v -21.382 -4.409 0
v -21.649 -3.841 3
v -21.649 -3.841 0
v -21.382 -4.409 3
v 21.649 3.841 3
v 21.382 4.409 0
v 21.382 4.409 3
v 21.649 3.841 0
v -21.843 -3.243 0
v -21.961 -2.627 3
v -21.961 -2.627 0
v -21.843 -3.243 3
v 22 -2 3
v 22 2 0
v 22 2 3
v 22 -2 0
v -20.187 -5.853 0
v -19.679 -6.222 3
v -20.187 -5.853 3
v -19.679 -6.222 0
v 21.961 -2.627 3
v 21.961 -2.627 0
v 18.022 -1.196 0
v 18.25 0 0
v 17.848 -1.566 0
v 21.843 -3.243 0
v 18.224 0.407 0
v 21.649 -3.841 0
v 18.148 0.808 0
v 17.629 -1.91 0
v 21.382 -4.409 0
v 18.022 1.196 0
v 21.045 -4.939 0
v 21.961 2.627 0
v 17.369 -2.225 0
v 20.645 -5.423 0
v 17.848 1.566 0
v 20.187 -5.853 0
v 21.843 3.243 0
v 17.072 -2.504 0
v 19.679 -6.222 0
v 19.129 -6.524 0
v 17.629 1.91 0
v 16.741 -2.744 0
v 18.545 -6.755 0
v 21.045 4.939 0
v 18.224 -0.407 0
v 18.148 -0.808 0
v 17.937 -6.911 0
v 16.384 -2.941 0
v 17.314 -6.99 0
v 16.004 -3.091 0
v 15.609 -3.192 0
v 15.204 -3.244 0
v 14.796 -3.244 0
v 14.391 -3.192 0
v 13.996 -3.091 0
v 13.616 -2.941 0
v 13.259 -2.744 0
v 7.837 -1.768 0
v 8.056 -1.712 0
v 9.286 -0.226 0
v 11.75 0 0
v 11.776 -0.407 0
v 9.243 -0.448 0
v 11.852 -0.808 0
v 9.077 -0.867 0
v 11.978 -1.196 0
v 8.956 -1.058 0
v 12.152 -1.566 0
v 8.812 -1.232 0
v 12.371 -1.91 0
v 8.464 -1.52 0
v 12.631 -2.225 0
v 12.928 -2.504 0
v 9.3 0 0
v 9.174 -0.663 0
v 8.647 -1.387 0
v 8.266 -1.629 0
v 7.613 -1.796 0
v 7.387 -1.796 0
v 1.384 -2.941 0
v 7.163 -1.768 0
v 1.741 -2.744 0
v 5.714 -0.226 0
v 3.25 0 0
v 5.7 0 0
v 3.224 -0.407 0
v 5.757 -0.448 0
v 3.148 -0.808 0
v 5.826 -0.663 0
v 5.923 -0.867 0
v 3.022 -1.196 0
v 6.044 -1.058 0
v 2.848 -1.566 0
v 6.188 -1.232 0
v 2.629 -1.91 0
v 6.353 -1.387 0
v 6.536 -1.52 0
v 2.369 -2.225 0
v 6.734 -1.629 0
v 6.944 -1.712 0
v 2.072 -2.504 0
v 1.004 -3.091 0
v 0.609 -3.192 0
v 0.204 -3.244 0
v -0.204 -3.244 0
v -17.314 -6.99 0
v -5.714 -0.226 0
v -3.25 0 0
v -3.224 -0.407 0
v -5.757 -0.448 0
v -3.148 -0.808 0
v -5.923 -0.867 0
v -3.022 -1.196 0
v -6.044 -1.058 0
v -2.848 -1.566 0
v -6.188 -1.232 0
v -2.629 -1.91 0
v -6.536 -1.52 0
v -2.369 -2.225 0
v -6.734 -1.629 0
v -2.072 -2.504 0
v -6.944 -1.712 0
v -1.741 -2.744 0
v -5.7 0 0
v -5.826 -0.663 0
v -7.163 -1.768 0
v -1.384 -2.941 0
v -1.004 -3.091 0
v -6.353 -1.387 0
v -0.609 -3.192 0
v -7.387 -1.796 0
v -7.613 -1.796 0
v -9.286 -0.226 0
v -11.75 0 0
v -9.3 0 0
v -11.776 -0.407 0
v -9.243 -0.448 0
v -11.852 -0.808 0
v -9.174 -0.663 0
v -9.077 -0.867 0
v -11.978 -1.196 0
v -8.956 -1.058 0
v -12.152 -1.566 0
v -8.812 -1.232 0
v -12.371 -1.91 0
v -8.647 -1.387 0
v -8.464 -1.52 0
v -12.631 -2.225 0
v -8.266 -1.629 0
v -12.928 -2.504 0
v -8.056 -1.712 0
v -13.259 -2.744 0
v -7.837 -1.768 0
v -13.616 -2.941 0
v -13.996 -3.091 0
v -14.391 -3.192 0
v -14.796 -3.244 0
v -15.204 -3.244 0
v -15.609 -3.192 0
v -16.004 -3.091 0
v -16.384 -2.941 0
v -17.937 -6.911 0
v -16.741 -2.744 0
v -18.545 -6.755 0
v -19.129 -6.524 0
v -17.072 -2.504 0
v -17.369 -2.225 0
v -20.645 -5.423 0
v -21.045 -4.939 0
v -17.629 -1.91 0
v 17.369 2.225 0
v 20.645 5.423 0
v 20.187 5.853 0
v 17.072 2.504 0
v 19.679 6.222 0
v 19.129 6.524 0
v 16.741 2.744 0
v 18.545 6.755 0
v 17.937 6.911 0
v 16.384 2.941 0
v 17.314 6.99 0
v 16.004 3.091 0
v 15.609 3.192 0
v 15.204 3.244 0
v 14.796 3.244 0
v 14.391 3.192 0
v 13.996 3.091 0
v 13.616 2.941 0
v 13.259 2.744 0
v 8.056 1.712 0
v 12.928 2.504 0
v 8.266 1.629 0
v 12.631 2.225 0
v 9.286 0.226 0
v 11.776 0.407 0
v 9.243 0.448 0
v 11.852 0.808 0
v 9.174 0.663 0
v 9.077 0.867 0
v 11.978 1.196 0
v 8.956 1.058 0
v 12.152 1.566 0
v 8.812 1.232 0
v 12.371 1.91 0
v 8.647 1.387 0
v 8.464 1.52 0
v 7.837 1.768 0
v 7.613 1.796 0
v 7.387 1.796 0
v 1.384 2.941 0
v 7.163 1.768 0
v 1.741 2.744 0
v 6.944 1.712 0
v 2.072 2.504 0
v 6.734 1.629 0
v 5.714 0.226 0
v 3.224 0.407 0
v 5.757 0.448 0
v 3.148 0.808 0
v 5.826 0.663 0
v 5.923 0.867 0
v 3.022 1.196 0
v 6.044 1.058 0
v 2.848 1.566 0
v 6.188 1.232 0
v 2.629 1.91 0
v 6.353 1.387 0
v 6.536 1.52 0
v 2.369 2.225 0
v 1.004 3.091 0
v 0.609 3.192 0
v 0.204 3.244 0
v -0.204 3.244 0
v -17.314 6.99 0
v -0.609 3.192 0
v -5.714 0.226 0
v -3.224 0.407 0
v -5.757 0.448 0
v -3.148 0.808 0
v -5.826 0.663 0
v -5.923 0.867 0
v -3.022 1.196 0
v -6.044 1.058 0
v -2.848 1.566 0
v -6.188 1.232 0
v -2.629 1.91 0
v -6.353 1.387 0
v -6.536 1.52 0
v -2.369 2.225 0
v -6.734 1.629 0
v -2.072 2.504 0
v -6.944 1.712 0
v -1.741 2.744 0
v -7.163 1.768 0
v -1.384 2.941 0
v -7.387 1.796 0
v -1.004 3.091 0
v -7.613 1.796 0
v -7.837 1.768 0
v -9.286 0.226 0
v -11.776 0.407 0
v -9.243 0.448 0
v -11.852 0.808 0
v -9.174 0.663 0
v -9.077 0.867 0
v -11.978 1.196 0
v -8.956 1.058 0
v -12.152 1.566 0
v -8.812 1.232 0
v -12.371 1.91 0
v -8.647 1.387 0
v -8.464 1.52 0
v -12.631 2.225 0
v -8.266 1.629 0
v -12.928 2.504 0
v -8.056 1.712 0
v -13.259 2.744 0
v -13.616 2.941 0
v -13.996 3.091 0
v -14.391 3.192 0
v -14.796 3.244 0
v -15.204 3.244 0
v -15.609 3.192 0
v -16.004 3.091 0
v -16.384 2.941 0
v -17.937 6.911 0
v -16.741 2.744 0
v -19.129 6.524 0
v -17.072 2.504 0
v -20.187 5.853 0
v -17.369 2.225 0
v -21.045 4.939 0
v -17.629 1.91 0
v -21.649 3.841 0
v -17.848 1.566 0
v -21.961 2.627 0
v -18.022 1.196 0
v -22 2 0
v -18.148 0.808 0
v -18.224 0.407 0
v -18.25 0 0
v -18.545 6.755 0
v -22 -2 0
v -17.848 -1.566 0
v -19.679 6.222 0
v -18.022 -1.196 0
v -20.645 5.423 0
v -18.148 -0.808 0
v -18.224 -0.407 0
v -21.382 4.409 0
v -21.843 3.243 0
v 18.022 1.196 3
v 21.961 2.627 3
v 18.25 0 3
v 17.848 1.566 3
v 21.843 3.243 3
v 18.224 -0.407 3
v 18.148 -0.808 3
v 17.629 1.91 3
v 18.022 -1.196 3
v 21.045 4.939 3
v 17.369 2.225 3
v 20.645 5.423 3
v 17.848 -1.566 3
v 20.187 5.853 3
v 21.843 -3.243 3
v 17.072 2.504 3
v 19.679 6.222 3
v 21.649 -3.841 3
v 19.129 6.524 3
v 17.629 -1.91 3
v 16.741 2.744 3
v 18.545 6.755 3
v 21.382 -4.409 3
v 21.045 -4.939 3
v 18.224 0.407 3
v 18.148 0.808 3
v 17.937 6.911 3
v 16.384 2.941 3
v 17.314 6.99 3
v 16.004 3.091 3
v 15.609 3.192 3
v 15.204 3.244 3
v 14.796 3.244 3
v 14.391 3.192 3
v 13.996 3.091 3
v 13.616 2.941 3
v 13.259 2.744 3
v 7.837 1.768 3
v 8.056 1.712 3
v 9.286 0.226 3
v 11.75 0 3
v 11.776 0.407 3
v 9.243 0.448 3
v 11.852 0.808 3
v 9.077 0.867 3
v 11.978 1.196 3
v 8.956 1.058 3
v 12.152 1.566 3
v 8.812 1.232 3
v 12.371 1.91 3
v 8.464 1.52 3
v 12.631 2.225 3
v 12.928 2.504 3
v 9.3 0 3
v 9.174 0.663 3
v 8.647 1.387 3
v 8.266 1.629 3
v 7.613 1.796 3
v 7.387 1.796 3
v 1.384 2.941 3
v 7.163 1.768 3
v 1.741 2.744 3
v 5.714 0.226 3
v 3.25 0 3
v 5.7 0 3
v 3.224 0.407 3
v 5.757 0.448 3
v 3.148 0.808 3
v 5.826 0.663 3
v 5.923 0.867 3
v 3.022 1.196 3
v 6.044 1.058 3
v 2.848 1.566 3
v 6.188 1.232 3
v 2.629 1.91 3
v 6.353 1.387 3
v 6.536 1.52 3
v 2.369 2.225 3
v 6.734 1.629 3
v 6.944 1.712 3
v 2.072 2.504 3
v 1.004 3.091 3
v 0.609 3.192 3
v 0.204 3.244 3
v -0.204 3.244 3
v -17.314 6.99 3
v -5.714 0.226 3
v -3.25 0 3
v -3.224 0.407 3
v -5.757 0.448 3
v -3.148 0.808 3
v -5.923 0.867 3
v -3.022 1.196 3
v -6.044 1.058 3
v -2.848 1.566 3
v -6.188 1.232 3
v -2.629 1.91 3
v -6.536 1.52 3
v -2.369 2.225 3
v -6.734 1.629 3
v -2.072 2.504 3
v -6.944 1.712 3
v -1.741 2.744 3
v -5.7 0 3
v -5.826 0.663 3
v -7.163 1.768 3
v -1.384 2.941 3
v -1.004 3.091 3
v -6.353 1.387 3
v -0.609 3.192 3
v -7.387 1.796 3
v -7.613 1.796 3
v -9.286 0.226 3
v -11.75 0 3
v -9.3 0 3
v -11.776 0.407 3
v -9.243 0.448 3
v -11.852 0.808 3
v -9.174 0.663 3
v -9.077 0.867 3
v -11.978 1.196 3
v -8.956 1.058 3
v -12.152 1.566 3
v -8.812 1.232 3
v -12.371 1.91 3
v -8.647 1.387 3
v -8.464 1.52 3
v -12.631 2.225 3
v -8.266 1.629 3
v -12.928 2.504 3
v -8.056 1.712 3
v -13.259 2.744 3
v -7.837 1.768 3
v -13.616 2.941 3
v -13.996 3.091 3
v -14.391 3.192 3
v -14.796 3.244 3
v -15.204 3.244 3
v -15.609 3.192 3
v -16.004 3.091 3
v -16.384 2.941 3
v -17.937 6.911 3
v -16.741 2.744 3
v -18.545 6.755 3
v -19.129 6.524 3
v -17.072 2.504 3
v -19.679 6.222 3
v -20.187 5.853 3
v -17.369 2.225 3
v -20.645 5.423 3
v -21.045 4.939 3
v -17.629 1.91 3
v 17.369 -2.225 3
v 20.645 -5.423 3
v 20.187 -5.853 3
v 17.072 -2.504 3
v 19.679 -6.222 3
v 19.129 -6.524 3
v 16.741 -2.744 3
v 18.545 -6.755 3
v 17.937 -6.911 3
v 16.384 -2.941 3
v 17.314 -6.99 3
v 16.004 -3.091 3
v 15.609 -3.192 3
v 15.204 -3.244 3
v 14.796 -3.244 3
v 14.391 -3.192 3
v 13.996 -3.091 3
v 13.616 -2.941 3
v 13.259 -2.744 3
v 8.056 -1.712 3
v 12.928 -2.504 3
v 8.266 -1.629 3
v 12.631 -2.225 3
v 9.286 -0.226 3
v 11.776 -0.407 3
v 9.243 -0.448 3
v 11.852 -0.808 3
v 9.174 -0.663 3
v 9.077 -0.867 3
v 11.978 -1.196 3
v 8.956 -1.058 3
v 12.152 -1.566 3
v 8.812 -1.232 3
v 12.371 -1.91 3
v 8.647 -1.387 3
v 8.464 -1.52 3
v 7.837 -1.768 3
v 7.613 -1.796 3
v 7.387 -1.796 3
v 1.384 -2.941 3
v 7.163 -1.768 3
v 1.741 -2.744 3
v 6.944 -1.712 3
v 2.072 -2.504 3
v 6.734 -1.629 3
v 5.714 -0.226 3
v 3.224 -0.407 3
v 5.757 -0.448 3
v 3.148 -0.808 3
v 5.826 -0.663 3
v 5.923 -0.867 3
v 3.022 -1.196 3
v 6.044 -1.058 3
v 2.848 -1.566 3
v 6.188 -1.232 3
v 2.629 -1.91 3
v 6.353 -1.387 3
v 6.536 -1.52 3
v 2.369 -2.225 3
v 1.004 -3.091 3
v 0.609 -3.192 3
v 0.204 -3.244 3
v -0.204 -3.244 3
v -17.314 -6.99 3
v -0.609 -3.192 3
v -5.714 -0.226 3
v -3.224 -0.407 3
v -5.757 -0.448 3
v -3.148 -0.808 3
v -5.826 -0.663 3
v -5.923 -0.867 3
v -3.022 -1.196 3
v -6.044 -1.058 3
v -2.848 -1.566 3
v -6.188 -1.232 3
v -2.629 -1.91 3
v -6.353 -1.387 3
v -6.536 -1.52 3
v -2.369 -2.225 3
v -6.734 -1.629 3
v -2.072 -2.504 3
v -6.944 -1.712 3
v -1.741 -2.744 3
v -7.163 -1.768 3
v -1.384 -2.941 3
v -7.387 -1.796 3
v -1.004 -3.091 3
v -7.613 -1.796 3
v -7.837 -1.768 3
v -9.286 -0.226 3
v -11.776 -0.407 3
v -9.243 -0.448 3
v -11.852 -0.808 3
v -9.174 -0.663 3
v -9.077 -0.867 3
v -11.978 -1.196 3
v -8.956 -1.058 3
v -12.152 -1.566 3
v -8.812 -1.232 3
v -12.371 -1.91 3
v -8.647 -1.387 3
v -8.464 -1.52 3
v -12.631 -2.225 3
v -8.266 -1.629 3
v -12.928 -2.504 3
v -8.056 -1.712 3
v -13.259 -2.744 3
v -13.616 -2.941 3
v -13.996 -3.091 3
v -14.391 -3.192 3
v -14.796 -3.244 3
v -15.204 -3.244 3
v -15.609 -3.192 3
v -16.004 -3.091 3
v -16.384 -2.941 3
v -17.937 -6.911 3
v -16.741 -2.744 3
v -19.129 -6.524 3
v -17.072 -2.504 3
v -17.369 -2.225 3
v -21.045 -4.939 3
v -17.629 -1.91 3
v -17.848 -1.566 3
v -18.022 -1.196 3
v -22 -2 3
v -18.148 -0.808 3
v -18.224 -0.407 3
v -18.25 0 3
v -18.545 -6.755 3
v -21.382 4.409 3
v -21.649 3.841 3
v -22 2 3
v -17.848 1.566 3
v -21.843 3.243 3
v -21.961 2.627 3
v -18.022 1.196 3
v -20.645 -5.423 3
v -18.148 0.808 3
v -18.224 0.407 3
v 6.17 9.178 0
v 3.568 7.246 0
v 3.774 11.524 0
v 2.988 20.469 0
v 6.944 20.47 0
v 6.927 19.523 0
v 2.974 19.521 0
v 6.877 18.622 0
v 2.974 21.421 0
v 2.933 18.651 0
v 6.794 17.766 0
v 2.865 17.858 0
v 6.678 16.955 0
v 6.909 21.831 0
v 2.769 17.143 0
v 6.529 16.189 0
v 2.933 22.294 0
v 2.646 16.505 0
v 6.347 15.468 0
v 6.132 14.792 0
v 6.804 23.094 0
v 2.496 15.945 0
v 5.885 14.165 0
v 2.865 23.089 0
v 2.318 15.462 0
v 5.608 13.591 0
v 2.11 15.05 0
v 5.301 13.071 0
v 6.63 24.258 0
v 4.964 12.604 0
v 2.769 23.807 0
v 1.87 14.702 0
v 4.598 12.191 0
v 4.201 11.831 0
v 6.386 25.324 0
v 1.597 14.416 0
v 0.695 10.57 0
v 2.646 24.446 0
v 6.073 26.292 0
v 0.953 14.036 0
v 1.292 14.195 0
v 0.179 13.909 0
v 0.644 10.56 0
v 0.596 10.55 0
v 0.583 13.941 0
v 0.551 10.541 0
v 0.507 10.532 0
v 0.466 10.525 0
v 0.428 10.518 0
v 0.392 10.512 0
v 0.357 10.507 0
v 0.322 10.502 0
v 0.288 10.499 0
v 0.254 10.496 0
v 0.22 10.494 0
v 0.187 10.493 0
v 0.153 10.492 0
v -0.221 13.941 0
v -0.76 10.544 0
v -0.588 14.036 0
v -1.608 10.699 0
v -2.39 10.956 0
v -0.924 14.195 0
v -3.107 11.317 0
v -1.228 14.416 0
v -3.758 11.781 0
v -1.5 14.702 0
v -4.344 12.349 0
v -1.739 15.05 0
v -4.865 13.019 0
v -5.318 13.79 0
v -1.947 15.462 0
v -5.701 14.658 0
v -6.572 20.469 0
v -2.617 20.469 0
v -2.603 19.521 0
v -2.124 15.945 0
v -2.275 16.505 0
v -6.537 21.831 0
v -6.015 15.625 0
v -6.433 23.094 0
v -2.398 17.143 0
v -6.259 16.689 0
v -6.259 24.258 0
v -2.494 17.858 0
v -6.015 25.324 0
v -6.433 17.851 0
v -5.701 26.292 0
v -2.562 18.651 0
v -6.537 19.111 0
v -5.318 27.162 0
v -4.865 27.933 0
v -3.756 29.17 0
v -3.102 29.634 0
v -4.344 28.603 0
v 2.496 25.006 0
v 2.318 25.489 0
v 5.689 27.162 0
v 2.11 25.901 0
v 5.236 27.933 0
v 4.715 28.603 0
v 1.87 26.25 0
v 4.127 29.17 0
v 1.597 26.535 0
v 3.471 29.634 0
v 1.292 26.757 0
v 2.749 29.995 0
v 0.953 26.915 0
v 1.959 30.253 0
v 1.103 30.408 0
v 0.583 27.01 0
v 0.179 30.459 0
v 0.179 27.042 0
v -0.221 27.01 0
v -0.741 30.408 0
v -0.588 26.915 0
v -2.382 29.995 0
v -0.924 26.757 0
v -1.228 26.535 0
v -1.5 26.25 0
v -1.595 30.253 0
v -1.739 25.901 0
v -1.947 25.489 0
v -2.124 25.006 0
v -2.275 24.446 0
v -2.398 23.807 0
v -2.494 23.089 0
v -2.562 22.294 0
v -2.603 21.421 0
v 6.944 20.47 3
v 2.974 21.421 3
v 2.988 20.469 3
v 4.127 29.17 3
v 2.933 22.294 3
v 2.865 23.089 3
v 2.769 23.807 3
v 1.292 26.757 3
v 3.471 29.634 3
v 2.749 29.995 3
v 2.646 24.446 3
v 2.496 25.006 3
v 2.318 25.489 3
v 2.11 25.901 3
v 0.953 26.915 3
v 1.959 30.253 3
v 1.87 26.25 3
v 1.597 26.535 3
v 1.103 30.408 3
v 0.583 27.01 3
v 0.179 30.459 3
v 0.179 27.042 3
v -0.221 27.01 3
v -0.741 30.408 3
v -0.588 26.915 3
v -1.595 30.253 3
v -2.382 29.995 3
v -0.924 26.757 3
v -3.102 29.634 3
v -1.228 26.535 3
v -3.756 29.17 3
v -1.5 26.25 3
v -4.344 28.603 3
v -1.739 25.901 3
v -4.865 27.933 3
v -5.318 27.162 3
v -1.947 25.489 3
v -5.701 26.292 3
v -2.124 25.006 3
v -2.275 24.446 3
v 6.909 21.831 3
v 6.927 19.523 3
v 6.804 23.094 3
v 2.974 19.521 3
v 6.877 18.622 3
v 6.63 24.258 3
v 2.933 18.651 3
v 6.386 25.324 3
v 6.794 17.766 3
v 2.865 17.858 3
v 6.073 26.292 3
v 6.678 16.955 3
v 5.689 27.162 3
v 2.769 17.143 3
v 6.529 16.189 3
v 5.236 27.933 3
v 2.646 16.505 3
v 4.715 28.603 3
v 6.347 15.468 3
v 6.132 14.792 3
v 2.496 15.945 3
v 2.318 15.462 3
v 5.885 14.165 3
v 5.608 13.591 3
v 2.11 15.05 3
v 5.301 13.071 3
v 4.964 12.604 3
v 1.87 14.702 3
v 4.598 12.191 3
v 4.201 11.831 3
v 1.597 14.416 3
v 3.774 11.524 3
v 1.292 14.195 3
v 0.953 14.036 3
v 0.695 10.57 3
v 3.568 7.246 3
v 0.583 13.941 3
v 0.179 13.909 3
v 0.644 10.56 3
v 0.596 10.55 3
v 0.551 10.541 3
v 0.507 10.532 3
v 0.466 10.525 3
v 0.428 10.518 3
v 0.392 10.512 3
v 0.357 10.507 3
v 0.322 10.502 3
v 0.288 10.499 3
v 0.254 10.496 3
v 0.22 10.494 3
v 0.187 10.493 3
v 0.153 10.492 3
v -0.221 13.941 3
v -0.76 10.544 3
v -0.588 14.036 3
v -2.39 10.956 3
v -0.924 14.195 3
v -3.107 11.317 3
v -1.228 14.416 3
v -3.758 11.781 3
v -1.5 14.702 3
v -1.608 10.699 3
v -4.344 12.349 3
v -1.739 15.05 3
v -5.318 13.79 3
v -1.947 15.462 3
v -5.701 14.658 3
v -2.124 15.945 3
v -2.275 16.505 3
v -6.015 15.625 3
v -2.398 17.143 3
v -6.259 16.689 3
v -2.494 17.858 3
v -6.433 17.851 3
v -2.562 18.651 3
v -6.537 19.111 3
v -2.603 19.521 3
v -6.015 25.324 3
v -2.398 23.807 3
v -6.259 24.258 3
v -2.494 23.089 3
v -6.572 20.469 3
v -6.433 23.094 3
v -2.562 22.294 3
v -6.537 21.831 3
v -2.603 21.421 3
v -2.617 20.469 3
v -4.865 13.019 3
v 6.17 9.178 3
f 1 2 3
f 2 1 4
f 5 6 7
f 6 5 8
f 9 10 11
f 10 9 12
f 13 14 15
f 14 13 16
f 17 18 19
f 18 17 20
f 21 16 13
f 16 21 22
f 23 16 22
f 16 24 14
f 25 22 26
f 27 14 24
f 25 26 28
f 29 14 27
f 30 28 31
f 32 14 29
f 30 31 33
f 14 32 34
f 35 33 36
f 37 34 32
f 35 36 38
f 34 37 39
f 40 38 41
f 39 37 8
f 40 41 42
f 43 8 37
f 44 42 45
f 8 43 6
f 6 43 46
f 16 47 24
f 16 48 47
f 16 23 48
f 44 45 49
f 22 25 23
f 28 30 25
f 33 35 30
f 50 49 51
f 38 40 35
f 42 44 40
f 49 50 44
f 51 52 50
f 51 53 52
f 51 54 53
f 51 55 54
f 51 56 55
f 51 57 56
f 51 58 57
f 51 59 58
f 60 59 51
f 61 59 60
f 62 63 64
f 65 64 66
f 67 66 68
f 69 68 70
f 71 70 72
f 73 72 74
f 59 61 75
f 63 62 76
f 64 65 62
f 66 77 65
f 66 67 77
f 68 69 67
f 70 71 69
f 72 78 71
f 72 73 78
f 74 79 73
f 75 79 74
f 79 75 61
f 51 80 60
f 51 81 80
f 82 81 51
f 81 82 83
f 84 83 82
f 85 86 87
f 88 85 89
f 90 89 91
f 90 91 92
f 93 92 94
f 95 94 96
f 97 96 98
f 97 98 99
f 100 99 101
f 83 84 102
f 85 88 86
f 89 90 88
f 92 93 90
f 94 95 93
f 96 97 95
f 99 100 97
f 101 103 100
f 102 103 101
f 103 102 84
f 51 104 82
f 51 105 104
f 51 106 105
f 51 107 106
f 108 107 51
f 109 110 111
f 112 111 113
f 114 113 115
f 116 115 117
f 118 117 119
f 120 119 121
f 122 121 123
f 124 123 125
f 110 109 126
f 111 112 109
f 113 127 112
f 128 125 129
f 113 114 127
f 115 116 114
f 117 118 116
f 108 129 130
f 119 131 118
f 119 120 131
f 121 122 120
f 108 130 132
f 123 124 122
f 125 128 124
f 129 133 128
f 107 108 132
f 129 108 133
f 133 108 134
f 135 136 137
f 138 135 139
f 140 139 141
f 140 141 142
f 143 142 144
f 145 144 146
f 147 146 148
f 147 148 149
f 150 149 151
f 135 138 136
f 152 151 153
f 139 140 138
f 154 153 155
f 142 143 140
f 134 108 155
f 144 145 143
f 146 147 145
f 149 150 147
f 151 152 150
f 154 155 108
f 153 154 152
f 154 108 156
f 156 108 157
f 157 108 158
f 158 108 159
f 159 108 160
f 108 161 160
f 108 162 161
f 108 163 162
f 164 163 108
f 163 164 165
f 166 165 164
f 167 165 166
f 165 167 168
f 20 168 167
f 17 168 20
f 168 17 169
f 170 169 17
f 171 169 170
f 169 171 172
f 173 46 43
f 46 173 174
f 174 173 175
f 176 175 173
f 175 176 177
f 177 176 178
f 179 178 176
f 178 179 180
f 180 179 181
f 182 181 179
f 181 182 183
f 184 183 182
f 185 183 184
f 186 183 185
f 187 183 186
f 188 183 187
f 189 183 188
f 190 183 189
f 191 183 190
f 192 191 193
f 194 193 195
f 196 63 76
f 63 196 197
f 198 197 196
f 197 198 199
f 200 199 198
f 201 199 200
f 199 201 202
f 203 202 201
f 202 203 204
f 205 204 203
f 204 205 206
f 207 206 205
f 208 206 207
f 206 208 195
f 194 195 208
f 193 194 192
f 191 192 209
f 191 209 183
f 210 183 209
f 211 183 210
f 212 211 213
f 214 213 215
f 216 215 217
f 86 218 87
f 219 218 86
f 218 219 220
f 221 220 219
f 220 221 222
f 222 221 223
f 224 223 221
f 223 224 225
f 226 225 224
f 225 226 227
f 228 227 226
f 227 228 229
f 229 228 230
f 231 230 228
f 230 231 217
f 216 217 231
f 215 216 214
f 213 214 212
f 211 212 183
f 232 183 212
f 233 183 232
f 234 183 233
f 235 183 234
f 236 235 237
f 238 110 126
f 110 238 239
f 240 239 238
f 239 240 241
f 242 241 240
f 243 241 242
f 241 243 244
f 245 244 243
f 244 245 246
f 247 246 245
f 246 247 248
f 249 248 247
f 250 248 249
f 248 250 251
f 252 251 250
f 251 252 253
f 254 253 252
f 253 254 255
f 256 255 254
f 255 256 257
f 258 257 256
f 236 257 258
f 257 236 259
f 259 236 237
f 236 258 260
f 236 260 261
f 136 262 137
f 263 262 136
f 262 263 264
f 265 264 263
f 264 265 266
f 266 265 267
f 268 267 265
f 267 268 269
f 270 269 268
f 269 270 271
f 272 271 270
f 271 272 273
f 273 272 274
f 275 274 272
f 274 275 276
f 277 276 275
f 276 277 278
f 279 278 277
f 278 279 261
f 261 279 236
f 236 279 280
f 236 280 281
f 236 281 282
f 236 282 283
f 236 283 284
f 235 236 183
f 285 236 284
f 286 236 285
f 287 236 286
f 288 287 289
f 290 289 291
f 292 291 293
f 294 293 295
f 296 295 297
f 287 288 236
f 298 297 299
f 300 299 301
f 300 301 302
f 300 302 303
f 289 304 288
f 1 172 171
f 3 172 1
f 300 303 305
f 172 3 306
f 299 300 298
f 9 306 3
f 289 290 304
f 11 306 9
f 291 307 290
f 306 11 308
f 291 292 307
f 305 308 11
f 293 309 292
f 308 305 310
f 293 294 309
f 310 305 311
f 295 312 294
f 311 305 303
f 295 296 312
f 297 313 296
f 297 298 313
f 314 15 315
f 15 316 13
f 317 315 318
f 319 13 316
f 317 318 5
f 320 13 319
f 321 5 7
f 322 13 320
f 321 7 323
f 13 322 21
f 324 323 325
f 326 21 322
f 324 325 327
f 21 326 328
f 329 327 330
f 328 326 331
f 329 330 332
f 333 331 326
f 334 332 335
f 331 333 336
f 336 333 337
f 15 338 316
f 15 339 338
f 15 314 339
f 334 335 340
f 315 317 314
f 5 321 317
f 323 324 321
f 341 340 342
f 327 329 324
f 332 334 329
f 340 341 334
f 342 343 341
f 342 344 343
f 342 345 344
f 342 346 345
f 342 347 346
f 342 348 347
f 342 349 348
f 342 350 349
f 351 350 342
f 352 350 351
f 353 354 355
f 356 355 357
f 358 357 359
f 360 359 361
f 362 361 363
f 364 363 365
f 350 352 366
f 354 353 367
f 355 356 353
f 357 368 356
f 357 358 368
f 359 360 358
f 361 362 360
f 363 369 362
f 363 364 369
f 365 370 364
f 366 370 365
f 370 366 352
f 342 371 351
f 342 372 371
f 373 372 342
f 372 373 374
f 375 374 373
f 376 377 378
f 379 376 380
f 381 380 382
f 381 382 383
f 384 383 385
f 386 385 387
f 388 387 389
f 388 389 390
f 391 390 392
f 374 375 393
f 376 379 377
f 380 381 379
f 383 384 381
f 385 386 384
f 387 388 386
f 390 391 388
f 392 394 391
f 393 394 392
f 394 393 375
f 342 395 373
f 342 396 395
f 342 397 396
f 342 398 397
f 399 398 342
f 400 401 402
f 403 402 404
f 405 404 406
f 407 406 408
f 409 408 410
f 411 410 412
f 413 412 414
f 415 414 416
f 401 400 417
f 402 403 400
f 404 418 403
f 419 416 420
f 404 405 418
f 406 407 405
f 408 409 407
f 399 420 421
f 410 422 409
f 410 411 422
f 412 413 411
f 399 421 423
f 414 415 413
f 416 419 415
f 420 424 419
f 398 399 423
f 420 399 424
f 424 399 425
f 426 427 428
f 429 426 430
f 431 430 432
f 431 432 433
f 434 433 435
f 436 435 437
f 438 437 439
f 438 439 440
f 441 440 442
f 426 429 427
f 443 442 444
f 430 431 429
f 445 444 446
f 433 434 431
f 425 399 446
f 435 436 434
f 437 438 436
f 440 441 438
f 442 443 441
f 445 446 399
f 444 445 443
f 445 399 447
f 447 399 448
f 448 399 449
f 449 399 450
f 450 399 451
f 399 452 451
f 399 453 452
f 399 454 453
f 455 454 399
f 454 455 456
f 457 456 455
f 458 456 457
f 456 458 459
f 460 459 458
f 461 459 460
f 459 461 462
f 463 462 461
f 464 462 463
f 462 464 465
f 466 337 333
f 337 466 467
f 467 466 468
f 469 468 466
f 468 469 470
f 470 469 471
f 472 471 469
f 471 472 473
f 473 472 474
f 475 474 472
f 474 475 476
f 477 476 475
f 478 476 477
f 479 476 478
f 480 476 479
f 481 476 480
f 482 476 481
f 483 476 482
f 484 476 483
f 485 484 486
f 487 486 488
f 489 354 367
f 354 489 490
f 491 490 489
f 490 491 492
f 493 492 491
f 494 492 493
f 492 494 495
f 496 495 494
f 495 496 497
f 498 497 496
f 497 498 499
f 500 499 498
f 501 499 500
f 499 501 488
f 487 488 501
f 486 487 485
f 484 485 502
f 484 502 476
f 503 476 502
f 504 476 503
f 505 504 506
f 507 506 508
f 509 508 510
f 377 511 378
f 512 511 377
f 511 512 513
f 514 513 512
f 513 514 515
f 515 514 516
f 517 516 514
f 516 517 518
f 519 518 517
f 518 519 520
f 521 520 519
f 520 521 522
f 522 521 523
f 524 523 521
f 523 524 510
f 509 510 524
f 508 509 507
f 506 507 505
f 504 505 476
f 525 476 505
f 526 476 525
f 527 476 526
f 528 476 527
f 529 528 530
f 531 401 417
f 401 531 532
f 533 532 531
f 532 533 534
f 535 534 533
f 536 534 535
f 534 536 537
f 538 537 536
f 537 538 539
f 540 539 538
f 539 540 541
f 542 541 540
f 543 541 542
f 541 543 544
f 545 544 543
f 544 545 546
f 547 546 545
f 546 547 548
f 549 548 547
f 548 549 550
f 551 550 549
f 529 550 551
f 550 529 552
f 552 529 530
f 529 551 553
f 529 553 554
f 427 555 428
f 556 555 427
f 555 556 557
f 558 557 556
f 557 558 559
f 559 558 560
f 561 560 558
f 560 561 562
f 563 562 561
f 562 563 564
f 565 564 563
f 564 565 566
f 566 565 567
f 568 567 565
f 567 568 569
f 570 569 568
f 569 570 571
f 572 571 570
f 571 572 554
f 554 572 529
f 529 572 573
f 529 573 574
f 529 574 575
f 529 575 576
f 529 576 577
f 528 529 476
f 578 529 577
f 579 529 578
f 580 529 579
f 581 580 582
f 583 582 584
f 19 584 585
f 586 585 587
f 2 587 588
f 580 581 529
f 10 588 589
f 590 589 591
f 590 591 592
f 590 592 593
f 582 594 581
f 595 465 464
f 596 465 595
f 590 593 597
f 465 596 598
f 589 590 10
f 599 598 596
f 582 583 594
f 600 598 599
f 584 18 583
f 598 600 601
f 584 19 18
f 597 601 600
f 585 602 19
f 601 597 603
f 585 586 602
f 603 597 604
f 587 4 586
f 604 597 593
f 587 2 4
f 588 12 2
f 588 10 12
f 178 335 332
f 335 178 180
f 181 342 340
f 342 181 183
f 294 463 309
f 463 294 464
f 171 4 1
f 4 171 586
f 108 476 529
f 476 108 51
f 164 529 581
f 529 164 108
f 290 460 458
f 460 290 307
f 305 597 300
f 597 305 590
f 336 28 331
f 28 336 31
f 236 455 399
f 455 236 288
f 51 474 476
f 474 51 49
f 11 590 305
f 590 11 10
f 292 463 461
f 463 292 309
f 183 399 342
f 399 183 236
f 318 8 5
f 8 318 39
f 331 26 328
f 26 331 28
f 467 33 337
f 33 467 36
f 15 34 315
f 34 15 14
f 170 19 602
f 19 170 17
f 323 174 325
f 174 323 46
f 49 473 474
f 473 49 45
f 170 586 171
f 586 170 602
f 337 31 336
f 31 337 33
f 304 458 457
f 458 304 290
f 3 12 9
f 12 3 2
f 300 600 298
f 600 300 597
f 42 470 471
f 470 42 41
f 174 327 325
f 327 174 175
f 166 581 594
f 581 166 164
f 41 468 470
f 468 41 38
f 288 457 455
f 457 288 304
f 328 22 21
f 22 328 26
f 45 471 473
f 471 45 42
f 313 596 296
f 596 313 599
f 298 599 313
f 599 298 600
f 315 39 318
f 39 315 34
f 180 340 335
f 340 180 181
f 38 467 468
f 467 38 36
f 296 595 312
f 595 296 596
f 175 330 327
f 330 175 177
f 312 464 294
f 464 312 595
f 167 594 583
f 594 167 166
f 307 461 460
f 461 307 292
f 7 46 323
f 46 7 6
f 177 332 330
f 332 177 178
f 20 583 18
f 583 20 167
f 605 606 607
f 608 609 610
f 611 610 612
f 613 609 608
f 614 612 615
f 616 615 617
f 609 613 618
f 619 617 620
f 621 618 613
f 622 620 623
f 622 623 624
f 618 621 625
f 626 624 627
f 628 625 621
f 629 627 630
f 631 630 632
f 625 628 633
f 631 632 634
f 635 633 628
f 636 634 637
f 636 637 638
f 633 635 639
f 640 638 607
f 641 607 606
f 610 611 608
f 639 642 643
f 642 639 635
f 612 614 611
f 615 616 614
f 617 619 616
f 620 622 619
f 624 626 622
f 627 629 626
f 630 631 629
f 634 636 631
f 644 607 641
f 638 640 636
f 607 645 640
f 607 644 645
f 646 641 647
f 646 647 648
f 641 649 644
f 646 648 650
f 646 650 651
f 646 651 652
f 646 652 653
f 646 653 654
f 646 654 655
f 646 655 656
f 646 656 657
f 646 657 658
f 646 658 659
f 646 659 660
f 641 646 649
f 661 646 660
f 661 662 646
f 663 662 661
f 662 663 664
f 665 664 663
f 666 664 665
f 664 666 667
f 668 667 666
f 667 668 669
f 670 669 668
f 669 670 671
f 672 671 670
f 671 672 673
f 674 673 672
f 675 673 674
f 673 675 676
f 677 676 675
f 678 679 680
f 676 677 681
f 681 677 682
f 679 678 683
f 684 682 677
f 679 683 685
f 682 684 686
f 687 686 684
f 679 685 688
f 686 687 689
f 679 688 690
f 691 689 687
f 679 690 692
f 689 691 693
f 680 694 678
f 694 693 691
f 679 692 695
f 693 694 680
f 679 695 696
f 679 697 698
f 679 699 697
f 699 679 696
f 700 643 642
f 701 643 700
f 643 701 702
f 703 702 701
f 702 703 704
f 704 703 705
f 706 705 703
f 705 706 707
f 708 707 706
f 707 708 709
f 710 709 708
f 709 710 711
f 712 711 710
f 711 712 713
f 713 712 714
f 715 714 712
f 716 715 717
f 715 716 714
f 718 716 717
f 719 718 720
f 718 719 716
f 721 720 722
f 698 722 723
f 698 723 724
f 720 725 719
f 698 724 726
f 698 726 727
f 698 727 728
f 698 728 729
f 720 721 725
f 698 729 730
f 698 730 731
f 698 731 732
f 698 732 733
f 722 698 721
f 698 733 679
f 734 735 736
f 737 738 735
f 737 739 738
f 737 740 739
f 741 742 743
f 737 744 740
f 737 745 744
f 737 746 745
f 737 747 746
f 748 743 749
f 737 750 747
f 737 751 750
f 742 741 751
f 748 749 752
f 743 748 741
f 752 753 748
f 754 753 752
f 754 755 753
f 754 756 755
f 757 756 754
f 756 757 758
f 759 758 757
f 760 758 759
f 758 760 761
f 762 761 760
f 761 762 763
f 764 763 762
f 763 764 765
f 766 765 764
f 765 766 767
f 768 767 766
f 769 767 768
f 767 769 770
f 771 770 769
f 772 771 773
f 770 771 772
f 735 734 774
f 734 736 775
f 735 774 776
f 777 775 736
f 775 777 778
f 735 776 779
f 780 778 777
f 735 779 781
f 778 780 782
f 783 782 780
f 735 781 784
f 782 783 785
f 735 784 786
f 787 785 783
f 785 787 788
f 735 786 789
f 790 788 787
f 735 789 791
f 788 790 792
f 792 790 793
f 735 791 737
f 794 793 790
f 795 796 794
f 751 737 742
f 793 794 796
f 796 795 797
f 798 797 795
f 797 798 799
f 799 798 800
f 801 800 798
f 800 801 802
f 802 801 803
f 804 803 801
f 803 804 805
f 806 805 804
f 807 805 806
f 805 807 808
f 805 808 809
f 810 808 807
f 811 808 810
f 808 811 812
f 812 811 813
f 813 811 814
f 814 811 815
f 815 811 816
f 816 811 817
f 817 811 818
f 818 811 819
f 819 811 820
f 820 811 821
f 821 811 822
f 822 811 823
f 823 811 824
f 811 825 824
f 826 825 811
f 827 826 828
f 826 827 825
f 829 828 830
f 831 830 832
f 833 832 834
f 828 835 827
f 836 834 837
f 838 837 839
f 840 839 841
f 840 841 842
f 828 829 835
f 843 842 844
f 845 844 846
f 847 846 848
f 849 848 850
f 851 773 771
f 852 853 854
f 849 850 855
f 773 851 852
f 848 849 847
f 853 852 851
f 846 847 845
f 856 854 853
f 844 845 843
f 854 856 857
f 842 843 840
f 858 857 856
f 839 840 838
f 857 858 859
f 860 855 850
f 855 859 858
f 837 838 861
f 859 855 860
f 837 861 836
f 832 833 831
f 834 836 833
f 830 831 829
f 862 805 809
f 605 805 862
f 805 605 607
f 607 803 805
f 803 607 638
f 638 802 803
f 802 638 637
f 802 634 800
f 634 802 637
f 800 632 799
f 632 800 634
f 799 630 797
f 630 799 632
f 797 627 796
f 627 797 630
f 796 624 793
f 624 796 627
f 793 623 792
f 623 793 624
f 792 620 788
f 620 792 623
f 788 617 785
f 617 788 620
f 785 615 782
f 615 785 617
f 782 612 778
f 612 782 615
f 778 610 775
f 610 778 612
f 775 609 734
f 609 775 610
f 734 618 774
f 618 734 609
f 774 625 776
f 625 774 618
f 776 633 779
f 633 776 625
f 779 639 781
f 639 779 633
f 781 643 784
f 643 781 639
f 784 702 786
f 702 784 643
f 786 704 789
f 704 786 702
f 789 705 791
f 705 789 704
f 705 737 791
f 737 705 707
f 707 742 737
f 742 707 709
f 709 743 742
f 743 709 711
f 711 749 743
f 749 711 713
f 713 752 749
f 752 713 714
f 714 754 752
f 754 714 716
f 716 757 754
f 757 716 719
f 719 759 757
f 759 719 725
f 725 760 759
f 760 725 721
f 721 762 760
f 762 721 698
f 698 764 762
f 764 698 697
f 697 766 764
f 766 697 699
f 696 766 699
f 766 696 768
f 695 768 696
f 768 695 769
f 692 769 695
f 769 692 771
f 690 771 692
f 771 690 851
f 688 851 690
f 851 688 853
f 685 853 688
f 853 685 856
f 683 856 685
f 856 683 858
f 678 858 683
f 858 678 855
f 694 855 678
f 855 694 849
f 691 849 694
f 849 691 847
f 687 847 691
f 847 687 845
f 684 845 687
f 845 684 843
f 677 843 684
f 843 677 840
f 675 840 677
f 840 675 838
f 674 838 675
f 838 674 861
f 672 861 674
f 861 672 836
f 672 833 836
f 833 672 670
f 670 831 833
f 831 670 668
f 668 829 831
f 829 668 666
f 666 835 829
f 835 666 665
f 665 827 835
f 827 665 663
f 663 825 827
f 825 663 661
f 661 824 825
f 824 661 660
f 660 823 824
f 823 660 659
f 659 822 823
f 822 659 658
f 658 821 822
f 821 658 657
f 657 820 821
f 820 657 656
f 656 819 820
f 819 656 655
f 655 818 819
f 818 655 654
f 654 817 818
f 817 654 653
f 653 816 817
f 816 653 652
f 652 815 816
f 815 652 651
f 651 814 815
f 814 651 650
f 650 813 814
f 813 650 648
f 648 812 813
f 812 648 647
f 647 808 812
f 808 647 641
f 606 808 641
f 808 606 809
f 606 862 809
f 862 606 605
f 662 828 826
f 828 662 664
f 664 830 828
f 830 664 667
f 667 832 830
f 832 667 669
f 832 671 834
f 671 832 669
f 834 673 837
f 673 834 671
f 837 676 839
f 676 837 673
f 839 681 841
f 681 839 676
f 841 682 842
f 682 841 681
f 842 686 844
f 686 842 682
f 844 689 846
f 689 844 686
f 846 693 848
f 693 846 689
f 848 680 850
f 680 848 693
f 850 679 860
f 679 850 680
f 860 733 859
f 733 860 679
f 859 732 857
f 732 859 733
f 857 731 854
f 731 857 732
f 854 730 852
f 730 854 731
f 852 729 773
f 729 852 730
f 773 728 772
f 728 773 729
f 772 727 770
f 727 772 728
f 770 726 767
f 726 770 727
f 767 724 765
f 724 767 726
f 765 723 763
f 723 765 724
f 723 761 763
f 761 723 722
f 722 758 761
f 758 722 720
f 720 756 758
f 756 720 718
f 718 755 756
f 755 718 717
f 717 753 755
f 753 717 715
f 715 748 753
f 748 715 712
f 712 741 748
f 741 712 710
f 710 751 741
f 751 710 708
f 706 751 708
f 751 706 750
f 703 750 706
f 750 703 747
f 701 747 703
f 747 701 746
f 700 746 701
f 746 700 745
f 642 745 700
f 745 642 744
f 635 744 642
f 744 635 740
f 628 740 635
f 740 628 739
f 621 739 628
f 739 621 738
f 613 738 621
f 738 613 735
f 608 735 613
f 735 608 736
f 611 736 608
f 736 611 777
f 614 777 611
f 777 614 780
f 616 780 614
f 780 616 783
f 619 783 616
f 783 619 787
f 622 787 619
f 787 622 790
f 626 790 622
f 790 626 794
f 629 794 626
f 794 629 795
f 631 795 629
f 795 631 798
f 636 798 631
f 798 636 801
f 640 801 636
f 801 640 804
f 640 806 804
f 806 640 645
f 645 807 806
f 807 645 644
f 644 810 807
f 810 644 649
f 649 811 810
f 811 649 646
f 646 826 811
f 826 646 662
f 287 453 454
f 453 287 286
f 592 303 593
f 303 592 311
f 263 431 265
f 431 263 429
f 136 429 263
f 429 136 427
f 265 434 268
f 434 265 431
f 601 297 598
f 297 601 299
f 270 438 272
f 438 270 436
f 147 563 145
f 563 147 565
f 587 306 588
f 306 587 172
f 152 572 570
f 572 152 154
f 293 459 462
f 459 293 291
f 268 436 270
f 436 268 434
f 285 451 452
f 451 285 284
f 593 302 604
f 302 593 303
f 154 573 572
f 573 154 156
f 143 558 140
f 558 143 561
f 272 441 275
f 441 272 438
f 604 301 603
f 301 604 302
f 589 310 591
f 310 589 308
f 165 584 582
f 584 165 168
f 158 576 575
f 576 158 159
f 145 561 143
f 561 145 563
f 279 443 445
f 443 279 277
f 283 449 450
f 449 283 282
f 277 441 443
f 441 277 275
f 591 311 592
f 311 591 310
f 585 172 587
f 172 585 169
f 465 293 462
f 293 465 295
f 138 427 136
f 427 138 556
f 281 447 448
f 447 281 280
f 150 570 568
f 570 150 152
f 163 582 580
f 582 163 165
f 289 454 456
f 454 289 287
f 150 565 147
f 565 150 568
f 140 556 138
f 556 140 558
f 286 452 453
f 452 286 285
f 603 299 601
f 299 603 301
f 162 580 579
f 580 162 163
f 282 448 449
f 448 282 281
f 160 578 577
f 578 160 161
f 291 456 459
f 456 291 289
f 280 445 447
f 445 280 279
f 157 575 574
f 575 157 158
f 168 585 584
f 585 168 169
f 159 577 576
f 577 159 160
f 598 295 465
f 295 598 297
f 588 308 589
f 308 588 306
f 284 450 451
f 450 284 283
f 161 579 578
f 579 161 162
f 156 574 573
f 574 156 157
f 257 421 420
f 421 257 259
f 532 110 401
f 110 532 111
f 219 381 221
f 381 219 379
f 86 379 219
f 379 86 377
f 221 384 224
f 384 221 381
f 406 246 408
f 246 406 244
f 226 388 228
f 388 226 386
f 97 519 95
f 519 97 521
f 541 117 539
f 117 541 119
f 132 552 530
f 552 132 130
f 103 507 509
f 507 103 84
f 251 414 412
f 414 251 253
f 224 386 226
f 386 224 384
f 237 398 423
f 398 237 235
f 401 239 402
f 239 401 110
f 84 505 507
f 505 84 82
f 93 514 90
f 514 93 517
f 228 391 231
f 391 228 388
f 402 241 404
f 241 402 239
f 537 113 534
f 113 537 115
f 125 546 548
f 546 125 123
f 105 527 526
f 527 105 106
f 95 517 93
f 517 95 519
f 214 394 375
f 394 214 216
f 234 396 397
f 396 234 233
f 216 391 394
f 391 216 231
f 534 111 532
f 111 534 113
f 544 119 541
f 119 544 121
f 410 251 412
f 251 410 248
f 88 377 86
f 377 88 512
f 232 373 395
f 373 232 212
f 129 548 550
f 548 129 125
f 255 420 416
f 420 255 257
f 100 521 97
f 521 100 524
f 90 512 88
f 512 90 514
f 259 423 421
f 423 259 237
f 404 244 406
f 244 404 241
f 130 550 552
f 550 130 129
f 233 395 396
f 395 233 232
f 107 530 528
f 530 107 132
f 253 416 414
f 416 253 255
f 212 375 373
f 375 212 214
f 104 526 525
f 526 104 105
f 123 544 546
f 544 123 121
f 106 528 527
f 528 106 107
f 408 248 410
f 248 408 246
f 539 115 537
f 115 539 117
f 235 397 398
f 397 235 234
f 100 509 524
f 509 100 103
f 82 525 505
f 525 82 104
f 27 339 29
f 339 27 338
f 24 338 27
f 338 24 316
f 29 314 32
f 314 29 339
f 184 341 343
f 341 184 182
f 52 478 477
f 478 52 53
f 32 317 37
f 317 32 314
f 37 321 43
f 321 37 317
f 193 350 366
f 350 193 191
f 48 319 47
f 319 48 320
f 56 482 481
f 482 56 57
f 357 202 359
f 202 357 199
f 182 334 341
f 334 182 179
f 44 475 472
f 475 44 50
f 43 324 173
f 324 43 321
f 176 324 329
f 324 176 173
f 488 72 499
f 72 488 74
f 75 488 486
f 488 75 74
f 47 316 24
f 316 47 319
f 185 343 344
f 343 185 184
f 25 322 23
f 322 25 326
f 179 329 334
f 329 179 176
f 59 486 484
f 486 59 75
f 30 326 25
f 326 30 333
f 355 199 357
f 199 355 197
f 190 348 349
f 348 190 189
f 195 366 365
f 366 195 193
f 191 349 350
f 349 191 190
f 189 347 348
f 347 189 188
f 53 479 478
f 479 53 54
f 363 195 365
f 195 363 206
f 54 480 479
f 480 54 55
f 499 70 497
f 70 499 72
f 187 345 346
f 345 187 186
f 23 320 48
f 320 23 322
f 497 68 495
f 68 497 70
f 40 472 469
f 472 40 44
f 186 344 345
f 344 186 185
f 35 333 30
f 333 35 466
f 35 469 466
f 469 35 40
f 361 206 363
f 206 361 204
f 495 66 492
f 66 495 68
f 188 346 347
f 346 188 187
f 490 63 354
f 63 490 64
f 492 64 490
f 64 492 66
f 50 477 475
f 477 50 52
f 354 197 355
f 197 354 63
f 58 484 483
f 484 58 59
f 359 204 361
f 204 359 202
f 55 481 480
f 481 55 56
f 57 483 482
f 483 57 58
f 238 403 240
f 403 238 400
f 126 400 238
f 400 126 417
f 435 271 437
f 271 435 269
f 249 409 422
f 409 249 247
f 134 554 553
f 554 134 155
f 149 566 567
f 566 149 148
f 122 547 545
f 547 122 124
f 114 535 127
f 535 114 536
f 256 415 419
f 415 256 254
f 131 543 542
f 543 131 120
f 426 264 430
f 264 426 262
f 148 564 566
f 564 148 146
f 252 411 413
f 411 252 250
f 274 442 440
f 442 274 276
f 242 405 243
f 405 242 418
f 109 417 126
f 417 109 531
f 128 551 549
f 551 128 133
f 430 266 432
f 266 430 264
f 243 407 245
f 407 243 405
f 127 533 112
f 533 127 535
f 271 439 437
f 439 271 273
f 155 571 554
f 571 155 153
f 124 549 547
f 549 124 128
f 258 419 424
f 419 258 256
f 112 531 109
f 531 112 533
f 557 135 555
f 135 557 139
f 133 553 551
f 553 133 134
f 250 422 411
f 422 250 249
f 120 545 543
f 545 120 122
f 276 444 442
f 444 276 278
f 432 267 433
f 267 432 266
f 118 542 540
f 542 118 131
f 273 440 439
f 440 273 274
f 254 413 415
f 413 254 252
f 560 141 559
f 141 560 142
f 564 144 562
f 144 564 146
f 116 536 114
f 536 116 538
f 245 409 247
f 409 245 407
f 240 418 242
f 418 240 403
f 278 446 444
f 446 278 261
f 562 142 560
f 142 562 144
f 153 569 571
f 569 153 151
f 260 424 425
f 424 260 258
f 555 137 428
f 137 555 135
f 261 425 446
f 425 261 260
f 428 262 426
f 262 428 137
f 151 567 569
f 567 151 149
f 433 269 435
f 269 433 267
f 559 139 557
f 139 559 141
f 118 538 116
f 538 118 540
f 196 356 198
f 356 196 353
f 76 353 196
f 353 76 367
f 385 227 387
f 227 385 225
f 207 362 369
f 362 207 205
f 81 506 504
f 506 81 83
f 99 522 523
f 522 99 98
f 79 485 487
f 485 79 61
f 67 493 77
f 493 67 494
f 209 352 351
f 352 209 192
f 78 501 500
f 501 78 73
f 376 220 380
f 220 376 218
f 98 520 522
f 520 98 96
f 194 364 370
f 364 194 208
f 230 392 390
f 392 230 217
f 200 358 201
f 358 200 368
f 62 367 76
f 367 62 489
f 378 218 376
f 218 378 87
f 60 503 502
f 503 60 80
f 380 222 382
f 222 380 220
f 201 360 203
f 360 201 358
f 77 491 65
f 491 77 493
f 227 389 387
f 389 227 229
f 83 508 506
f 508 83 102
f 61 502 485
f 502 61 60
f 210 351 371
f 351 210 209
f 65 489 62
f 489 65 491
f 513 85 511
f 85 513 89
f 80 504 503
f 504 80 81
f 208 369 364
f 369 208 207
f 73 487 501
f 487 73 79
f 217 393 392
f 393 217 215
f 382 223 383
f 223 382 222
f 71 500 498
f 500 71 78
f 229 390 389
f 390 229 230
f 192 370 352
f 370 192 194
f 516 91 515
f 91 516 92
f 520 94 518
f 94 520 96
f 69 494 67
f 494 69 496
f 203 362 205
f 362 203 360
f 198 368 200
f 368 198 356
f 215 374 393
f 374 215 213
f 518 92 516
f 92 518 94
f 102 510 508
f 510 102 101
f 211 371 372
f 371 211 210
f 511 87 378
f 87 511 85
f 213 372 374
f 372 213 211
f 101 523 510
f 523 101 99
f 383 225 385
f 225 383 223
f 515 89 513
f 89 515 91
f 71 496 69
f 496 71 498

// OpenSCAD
$fn = 50;


difference() {
	union() {
		hull() {
			translate(v = [-17.0000000000, 2.0000000000, 0]) {
				cylinder(h = 3, r = 5);
			}
			translate(v = [17.0000000000, 2.0000000000, 0]) {
				cylinder(h = 3, r = 5);
			}
			translate(v = [-17.0000000000, -2.0000000000, 0]) {
				cylinder(h = 3, r = 5);
			}
			translate(v = [17.0000000000, -2.0000000000, 0]) {
				cylinder(h = 3, r = 5);
			}
		}
		translate(v = [0, 30.0000000000, 0]) {
			linear_extrude(height = 3) {
				text(font = "DejaVu Sans Mono:style=Bold", halign = "center", size = 19.0000000000, text = "Q", valign = "top");
			}
		}
	}
	union() {
		translate(v = [-15.0000000000, 0.0000000000, 0]) {
			translate(v = [0, 0, -100]) {
				cylinder(h = 200, r = 3.2500000000);
			}
		}
		translate(v = [0, 0, -100]) {
			cylinder(h = 200, r = 3.2500000000);
		}
		translate(v = [15.0000000000, 0.0000000000, 0]) {
			translate(v = [0, 0, -100]) {
				cylinder(h = 200, r = 3.2500000000);
			}
		}
		translate(v = [-15.0000000000, 0.0000000000, 0]) {
			translate(v = [0, 0, -100]) {
				cylinder(h = 200, r = 1.8000000000);
			}
		}
		translate(v = [-7.5000000000, 0.0000000000, 0]) {
			translate(v = [0, 0, -100]) {
				cylinder(h = 200, r = 1.8000000000);
			}
		}
		translate(v = [0, 0, -100]) {
			cylinder(h = 200, r = 1.8000000000);
		}
		translate(v = [7.5000000000, 0.0000000000, 0]) {
			translate(v = [0, 0, -100]) {
				cylinder(h = 200, r = 1.8000000000);
			}
		}
		translate(v = [15.0000000000, 0.0000000000, 0]) {
			translate(v = [0, 0, -100]) {
				cylinder(h = 200, r = 1.8000000000);
			}
		}
	}
}
